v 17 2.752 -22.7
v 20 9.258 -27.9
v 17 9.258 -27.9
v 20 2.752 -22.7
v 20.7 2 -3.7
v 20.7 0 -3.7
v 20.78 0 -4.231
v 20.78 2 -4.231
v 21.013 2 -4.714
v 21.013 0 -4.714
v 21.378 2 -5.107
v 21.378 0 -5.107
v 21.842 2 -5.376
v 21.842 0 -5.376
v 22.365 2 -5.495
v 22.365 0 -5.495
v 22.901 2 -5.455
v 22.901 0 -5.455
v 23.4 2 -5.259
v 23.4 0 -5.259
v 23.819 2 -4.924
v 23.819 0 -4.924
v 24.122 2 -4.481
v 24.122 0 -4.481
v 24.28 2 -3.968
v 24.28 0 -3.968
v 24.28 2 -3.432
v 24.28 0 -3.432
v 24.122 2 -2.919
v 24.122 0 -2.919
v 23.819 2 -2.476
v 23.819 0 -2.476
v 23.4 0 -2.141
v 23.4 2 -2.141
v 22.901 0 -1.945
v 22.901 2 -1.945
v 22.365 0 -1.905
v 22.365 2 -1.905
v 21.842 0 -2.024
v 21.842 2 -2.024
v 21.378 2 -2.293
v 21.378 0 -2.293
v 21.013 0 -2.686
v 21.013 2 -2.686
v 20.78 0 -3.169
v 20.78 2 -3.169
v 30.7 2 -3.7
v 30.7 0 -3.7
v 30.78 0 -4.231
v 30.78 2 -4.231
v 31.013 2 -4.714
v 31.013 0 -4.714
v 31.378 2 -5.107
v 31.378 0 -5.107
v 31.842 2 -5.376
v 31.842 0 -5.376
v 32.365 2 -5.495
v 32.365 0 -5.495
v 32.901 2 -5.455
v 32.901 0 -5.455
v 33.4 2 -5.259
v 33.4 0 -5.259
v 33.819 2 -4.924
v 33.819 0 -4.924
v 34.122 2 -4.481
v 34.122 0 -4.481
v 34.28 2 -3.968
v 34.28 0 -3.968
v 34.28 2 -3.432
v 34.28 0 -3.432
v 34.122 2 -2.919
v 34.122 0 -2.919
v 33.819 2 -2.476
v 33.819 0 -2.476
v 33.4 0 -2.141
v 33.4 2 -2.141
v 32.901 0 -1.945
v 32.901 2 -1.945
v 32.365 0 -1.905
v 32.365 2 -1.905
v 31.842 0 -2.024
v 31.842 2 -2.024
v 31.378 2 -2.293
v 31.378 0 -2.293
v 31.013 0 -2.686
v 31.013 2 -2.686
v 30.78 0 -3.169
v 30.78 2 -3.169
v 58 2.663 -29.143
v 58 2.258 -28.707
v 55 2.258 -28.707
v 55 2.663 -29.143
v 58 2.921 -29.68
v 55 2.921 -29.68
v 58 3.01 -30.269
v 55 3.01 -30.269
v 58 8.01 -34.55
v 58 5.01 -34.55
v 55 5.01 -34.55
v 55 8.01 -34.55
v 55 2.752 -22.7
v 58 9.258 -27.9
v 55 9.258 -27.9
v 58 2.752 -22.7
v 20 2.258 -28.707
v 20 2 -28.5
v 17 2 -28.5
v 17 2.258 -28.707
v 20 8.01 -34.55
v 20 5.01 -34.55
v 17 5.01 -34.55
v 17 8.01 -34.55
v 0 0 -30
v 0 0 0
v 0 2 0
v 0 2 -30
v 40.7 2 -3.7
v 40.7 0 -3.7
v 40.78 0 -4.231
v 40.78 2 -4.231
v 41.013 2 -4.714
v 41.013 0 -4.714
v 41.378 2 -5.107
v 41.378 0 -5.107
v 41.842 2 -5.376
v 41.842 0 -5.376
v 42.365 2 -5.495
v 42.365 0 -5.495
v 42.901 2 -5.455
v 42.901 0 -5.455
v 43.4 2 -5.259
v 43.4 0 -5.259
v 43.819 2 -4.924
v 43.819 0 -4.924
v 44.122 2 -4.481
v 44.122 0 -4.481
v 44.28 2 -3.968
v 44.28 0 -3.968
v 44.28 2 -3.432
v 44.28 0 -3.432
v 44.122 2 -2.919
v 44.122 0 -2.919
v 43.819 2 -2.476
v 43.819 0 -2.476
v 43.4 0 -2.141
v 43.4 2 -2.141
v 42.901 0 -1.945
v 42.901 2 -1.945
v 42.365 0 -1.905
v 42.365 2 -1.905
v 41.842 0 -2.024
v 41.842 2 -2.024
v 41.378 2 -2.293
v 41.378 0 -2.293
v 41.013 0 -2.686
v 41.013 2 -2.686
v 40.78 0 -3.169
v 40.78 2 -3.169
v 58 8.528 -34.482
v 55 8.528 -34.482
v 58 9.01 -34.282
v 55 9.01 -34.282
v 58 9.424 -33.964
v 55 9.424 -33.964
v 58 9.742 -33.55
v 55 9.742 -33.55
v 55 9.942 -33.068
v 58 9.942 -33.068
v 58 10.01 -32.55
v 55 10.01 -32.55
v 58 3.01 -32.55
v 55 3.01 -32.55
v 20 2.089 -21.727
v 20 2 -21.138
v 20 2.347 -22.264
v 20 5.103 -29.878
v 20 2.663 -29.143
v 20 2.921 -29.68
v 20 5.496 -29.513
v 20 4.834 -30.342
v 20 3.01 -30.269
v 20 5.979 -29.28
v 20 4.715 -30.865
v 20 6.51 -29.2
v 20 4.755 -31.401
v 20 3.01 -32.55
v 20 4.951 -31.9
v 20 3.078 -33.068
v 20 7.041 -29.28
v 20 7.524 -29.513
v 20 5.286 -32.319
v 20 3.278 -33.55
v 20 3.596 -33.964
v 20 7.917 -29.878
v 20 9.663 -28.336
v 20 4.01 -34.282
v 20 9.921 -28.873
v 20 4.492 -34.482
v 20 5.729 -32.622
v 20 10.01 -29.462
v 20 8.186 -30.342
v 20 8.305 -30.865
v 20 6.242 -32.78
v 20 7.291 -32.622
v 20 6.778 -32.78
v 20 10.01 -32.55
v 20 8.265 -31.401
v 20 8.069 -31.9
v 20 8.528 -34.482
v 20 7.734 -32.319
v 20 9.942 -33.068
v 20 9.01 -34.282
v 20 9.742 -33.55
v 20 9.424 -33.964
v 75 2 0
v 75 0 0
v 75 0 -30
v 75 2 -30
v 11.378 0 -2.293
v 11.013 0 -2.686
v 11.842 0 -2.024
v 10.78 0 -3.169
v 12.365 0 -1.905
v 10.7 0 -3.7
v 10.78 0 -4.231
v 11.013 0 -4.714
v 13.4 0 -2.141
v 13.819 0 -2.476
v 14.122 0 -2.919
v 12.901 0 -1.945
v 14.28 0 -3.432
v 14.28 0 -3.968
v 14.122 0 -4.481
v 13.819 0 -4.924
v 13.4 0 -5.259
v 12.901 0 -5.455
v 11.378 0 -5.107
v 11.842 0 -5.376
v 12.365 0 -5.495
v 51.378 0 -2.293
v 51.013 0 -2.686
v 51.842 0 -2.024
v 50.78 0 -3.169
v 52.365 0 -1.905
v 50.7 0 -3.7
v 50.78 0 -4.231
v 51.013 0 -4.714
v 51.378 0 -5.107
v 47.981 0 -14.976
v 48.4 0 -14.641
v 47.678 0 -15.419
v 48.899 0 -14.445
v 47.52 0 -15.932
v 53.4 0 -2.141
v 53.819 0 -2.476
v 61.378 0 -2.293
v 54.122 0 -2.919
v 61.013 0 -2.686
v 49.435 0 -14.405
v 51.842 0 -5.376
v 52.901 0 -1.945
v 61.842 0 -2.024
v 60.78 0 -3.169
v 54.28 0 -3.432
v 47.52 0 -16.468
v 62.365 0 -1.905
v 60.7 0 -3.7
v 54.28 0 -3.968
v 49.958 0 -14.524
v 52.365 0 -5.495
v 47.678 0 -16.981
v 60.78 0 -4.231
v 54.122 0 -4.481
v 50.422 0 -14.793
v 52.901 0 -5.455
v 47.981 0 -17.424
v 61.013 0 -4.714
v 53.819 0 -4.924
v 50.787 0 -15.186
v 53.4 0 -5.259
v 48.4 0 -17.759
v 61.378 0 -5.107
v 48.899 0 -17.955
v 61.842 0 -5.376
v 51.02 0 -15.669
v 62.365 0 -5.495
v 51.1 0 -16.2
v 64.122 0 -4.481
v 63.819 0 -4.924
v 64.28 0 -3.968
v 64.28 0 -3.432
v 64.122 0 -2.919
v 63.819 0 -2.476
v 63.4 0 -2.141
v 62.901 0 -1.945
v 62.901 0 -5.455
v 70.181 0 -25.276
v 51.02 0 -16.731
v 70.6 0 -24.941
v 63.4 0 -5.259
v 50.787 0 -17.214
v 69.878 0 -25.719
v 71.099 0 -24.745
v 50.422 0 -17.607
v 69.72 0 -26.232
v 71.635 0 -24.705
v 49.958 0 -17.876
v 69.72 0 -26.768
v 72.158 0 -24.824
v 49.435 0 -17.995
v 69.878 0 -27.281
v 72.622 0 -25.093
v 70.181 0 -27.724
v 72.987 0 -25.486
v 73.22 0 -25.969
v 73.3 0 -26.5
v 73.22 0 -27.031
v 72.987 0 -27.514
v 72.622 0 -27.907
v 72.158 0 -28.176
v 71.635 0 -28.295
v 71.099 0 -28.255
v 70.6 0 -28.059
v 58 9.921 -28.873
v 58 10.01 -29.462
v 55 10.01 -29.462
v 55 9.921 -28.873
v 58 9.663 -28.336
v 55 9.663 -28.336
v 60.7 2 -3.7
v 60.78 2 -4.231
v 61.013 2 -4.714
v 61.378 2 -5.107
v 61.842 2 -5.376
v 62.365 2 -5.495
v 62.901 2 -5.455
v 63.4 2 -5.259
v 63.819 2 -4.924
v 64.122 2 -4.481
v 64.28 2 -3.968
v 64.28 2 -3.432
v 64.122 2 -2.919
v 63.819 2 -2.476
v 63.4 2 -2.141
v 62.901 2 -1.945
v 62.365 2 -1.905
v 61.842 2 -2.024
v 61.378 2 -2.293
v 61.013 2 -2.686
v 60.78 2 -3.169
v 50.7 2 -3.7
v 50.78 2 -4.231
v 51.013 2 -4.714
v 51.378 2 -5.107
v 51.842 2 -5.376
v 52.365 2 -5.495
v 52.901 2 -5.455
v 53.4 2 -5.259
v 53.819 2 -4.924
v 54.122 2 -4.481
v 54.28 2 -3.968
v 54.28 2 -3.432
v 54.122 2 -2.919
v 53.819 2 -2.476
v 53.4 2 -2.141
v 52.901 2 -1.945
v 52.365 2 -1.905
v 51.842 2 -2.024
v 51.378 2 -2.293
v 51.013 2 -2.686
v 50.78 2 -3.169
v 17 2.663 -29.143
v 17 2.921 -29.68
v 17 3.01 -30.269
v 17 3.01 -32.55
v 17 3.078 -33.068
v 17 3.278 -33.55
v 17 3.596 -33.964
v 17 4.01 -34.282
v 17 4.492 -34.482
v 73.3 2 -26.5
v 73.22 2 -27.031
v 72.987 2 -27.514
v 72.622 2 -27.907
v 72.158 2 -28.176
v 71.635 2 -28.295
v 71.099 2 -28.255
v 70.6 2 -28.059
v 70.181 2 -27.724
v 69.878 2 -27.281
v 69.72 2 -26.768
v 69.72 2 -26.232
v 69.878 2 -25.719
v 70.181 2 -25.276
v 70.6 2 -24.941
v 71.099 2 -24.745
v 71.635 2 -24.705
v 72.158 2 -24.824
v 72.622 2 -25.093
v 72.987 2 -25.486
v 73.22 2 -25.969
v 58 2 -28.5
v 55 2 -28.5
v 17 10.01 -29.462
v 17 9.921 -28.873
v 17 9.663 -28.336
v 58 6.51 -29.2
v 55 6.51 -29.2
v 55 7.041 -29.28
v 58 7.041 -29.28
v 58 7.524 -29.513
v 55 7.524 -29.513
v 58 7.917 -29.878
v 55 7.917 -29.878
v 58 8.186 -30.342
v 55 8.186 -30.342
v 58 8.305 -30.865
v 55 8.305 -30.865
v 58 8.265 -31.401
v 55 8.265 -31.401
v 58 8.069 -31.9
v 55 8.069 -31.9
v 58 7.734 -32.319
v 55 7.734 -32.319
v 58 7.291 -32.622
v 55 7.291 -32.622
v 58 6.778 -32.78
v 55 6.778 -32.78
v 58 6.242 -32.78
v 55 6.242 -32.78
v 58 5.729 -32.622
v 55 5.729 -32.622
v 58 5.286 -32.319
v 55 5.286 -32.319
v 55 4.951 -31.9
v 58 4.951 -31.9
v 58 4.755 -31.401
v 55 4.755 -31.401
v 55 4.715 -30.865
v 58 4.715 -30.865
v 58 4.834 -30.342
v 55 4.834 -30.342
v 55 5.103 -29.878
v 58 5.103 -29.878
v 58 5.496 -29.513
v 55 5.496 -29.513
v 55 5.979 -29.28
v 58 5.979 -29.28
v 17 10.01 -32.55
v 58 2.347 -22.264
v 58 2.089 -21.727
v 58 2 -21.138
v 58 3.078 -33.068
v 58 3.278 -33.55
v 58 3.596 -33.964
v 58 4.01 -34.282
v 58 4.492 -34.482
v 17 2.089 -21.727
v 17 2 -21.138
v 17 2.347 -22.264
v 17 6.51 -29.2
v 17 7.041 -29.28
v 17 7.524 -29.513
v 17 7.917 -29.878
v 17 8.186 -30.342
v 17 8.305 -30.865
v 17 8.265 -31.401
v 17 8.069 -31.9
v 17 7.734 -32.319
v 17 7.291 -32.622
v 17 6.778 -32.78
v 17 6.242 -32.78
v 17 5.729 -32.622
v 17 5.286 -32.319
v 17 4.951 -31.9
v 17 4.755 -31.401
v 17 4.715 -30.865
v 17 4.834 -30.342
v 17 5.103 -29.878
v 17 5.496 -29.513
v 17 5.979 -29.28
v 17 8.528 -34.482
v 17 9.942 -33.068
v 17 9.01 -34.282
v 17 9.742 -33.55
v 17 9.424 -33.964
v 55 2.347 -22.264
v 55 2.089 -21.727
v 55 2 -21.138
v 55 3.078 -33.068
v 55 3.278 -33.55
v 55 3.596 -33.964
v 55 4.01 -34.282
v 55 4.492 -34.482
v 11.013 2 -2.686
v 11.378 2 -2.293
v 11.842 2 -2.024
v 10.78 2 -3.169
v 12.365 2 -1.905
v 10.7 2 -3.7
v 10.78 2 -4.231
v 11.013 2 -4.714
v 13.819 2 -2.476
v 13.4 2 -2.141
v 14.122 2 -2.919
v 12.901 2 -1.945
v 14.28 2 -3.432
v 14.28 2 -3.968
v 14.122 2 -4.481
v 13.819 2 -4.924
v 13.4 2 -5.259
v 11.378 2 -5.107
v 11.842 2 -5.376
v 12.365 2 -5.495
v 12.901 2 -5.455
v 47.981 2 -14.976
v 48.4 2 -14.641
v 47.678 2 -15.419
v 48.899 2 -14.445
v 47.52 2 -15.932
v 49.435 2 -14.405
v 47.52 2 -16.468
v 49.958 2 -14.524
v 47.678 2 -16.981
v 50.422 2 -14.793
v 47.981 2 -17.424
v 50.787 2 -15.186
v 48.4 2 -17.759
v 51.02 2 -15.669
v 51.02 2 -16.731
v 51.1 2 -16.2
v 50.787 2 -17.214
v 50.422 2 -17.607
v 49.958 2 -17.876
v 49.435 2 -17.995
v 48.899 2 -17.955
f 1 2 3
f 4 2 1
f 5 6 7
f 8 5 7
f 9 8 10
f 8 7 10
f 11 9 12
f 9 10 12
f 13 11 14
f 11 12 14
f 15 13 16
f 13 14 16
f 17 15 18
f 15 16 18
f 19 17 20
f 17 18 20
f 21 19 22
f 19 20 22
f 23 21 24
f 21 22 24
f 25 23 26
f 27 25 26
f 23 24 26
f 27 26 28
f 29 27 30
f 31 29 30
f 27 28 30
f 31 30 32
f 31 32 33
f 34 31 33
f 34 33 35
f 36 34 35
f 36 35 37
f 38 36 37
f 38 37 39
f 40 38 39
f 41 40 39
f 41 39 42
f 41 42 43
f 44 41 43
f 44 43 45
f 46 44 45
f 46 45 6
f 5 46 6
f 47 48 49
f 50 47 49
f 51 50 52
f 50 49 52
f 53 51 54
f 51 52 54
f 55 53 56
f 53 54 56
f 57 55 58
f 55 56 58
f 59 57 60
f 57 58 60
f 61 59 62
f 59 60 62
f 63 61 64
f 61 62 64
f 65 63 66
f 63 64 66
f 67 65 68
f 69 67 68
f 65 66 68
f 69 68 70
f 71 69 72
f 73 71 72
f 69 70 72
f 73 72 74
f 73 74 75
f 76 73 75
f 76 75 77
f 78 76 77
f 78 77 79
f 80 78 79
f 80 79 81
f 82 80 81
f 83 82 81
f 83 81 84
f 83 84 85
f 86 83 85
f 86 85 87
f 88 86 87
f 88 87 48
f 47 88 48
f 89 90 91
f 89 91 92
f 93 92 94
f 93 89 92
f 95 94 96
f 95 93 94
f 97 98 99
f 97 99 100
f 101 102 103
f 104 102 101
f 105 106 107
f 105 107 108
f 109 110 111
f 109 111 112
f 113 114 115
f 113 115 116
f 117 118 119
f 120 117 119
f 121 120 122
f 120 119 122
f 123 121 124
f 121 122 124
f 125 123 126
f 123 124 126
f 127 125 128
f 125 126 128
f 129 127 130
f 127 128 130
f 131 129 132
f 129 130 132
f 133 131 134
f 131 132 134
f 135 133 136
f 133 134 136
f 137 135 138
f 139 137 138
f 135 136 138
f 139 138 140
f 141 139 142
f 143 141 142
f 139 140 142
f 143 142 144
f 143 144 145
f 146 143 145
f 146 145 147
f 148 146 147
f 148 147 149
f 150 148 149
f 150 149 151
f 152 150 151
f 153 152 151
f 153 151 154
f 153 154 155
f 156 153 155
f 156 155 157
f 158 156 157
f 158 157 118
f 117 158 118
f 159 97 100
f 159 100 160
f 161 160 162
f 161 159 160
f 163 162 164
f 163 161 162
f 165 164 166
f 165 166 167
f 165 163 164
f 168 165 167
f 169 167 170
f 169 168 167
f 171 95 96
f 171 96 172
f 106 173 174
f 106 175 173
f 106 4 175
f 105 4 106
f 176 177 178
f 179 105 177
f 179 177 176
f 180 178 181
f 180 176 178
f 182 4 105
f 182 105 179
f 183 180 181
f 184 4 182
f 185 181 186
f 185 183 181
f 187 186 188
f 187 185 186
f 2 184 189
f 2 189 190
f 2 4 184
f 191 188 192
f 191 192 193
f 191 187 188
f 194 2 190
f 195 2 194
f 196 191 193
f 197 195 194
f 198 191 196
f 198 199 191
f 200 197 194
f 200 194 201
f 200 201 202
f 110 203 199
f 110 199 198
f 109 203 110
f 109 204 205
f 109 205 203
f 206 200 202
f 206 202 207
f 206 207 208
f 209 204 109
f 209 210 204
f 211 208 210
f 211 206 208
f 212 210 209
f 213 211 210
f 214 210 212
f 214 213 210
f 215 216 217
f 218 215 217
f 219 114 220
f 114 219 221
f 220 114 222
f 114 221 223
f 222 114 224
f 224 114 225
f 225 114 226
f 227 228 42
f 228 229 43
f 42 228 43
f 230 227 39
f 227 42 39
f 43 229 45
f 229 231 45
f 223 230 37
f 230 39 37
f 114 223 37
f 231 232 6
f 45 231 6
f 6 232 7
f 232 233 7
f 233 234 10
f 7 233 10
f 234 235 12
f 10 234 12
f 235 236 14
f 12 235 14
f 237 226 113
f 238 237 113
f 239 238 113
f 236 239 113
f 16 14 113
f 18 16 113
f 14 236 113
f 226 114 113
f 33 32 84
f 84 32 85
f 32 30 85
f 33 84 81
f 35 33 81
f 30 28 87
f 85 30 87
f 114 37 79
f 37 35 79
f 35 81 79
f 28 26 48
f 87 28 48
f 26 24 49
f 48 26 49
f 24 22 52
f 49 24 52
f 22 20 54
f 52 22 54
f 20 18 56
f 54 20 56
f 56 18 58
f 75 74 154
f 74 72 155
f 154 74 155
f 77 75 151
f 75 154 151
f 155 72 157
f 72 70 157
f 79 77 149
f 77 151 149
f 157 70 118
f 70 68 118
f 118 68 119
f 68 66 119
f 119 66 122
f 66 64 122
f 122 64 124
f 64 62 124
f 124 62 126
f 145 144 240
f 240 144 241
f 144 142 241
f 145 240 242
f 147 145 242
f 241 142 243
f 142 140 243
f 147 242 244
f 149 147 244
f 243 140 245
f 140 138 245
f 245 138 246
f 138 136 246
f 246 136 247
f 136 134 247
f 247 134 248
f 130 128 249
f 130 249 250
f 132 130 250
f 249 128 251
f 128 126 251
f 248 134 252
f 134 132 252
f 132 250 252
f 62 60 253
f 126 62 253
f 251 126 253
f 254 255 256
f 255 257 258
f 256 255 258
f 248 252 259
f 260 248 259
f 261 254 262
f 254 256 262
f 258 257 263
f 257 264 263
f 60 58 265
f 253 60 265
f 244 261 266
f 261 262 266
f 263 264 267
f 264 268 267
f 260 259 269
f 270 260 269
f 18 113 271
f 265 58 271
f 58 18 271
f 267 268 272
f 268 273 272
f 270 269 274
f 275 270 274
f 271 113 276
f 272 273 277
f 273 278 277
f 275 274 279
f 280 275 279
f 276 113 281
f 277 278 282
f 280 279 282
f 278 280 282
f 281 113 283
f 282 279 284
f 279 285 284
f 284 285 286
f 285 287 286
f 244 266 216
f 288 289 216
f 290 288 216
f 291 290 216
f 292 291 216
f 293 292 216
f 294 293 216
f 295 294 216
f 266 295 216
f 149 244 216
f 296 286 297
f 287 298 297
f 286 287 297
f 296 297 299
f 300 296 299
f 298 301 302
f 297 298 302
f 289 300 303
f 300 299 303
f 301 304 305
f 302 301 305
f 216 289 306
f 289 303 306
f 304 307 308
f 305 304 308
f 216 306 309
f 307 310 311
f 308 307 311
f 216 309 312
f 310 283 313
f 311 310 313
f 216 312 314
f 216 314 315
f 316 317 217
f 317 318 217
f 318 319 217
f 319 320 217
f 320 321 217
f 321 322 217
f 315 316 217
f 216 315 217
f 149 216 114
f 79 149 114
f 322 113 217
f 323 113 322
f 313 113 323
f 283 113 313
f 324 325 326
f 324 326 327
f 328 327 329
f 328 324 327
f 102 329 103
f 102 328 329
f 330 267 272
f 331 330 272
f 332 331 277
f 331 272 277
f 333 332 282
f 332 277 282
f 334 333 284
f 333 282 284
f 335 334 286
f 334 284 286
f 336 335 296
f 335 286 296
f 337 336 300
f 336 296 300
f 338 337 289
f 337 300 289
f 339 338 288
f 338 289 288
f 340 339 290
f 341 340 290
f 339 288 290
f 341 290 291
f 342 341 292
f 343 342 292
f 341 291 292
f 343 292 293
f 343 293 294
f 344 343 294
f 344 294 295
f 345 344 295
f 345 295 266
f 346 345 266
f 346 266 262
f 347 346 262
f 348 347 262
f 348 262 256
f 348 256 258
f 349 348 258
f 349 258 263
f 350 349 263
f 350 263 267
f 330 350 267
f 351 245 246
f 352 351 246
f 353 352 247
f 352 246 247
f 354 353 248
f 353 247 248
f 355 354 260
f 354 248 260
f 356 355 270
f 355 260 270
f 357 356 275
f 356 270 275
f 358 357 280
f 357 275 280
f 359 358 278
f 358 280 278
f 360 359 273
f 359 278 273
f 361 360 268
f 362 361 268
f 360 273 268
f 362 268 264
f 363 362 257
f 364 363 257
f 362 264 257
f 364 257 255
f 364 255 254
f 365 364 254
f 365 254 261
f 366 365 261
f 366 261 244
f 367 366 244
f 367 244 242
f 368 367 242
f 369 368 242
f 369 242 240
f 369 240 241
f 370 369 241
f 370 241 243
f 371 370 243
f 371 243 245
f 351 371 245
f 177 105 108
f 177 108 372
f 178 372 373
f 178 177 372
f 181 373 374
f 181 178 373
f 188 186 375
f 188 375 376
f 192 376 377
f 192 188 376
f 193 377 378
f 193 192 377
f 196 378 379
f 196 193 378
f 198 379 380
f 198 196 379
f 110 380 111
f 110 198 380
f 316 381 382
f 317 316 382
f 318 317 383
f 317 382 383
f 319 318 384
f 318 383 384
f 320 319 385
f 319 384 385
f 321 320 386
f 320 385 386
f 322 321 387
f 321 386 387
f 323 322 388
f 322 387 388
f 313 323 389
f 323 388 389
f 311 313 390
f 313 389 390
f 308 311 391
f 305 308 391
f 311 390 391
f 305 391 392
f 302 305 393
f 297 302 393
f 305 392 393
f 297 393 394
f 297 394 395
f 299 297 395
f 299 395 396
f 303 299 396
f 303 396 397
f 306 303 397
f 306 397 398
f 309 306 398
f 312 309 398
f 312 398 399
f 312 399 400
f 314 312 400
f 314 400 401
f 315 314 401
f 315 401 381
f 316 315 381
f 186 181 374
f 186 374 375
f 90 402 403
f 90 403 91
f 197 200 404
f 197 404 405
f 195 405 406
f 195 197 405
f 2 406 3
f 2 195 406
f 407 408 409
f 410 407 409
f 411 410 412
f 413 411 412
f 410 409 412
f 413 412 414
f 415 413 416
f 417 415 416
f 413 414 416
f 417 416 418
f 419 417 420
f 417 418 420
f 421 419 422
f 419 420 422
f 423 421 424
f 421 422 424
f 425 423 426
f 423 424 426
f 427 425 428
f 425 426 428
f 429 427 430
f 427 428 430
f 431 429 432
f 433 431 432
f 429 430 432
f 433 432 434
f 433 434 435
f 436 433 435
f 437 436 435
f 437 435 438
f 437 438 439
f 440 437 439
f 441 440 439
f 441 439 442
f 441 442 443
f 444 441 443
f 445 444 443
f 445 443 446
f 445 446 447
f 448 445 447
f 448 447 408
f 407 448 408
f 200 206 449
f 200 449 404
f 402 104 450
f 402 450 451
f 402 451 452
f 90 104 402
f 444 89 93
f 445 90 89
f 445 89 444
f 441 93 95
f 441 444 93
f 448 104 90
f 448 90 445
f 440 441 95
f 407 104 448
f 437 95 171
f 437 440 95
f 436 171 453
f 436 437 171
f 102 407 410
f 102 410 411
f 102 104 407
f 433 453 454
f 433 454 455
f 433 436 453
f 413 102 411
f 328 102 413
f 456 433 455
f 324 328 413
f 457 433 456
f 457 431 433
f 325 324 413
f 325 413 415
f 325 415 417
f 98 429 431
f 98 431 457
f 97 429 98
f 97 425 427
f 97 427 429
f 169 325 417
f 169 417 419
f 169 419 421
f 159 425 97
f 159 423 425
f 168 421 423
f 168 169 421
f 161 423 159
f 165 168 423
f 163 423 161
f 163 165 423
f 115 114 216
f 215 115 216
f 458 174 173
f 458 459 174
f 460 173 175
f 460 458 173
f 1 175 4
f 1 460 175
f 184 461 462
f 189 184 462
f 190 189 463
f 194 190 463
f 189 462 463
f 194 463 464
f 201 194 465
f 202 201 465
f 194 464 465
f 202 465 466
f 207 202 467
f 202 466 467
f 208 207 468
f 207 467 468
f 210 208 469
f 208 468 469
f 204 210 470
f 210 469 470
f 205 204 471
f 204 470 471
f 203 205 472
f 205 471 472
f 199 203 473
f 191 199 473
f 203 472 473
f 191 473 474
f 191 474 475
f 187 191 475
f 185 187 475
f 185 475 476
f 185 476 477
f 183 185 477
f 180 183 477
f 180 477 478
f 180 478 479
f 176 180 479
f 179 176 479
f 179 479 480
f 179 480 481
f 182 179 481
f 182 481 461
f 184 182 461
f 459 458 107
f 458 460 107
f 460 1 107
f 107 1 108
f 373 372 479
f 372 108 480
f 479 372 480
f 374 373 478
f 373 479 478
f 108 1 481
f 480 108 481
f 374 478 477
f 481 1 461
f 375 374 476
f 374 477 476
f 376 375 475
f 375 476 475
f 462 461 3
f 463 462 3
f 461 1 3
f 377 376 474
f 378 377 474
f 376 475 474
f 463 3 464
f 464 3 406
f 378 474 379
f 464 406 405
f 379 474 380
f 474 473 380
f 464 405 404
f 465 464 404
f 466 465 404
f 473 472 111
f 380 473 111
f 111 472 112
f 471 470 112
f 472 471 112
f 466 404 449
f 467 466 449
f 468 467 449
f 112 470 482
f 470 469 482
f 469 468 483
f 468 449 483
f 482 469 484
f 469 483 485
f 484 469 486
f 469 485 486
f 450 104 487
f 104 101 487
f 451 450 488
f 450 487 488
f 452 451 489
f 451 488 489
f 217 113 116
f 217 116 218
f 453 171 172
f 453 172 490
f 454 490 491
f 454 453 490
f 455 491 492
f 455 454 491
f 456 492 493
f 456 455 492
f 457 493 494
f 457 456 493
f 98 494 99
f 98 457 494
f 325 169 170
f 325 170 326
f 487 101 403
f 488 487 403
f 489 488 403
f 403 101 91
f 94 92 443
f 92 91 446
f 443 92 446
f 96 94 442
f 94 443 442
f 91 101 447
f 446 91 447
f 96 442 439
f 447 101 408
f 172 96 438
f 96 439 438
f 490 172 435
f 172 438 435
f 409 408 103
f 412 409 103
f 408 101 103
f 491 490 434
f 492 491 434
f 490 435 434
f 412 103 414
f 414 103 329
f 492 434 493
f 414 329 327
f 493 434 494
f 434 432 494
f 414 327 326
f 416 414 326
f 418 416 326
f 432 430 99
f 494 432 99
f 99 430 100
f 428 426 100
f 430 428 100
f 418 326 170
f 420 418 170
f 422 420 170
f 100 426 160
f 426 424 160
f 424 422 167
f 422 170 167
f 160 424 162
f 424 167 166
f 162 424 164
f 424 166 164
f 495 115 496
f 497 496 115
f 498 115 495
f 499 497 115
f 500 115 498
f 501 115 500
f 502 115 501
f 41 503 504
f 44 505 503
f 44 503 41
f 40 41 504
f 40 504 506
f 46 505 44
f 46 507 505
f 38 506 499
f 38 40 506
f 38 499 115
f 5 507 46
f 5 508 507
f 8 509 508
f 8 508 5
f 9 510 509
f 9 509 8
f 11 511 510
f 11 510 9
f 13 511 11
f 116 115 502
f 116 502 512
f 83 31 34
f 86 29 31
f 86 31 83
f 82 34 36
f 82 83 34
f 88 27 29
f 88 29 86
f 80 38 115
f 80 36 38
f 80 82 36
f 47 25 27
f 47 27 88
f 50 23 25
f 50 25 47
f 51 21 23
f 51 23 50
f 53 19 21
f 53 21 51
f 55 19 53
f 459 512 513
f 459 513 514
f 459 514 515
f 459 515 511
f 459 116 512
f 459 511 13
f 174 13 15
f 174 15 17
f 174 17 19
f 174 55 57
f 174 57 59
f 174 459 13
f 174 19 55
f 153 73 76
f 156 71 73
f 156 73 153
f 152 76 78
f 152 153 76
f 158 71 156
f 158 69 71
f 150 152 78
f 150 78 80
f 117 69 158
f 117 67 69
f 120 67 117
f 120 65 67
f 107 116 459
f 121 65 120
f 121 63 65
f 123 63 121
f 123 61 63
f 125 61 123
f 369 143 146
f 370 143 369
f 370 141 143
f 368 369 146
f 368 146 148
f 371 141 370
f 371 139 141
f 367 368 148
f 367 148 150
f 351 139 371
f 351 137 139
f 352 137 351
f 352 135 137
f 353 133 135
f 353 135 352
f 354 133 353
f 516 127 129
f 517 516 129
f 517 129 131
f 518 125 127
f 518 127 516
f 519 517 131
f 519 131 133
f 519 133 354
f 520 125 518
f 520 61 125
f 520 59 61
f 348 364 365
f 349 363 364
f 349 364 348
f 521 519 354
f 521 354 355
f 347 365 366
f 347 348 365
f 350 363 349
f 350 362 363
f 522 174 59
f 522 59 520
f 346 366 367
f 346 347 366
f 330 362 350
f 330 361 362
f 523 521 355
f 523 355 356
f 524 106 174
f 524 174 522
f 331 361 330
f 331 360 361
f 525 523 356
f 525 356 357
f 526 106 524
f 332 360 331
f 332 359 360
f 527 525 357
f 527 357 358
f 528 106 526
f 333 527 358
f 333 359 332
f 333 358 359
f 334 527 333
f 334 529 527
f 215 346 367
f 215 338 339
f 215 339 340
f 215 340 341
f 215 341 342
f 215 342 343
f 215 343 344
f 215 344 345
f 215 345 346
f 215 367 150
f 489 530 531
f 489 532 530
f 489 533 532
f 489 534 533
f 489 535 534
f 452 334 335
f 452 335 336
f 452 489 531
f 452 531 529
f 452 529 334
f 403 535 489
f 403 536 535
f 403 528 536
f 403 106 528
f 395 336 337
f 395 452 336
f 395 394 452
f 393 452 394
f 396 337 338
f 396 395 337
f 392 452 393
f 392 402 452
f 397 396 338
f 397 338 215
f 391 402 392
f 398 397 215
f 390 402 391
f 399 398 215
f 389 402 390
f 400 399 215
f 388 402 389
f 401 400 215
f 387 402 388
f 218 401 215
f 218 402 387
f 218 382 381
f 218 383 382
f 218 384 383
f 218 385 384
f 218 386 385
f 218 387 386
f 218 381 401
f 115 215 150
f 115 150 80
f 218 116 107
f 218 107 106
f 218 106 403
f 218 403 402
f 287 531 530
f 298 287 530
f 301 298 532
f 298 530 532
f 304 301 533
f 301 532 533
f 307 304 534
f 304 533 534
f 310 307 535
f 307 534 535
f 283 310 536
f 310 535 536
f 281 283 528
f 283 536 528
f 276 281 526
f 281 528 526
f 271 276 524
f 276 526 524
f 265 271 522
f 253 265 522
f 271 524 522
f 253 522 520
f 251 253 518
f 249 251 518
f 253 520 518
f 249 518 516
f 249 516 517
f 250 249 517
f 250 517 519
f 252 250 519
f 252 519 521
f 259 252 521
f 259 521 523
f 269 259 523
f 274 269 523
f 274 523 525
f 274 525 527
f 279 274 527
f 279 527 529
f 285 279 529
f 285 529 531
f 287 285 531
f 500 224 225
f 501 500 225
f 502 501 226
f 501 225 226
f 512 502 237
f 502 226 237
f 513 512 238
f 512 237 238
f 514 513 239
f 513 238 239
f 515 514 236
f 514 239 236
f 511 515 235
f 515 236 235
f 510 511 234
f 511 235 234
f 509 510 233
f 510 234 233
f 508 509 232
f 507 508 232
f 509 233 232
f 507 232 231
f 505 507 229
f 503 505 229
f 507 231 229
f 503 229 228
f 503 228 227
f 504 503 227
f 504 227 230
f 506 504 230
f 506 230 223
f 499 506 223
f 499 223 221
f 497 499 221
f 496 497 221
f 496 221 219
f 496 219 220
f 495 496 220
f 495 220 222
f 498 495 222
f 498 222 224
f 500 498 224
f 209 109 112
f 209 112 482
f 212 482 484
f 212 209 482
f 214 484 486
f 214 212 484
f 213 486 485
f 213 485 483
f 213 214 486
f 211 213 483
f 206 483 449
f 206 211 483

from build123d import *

# Parameters (mm, degrees)
SKETCH1_W            = 75
SKETCH1_H            = 30
BOSS_EXTRUDE1_DEPTH  = 2
M3_CLEARANCE_HOLE1_D = 3.6
SKETCH4_R            = 1.75
BOSS_EXTRUDE2_DEPTH  = 3
BOSS_EXTRUDE3_START  = -38
SKETCH4_2_R          = 1.75
BOSS_EXTRUDE3_DEPTH  = 3
FILLET1_R            = 2
M3_CLEARANCE_HOLE2_D = 3.6
M3_CLEARANCE_HOLE3_D = 3.6


with BuildPart() as part:
    # Sketch1 → Boss-Extrude1 (new body)
    with BuildSketch(Plane(origin=(0, 0, 0), x_dir=(1, 0, 0), z_dir=(0, 1, 0))):
        with Locations((37.5, 15)):
            Rectangle(SKETCH1_W, SKETCH1_H)
    extrude(amount=BOSS_EXTRUDE1_DEPTH)

    # M3 Clearance Hole1 (through all)
    with Locations(Plane(origin=(0, 2, 0), x_dir=(1, 0, 0), z_dir=(0, 1, 0))):
        with Locations((42.5, 3.7), (32.5, 3.7), (22.5, 3.7), (12.5, 3.7), (62.5, 3.7), (52.5, 3.7)):
            Hole(M3_CLEARANCE_HOLE1_D / 2)

    # Sketch4 → Boss-Extrude2 (add)
    # profile 1 of 2: a face of its own
    with BuildSketch(Plane.ZY.offset(-20)):
        with BuildLine():
            ThreePointArc((-29.462001252, 10.010018789), (-28.595073643, 9.812360744), (-27.899501252, 9.258455311))
            Line((-27.899501252, 9.258455311), (-22.1, 2))
            Line((-22.1, 2), (-28.5, 2))
            Line((-28.5, 2), (-28.706505632, 2.258455311))
            ThreePointArc((-28.706505632, 2.258455311), (-29.402078024, 2.812360744), (-30.269005632, 3.010018789))
            Line((-30.269005632, 3.010018789), (-32.55, 3.010018789))
            ThreePointArc((-32.55, 3.010018789), (-33.964213562, 3.595805227), (-34.55, 5.010018789))
            Line((-34.55, 5.010018789), (-34.55, 8.010018789))
            ThreePointArc((-34.55, 8.010018789), (-33.964213562, 9.424232352), (-32.55, 10.010018789))
            Line((-32.55, 10.010018789), (-29.462001252, 10.010018789))
        make_face()
        with Locations((-31, 6.510018789)):
            Circle(SKETCH4_R, mode=Mode.SUBTRACT)
    # profile 2 of 2: a face of its own
    with BuildSketch(Plane.ZY.offset(-20)):
        with Locations((-31, 6.510018789)):
            Circle(SKETCH4_R)
    extrude(amount=BOSS_EXTRUDE2_DEPTH)

    # Sketch4<2> → Boss-Extrude3 (add)
    # profile 1 of 2: a face of its own
    with BuildSketch(Plane.ZY.offset(-20).offset(BOSS_EXTRUDE3_START)):
        with BuildLine():
            ThreePointArc((-29.462001252, 10.010018789), (-28.595073643, 9.812360744), (-27.899501252, 9.258455311))
            Line((-27.899501252, 9.258455311), (-22.1, 2))
            Line((-22.1, 2), (-28.5, 2))
            Line((-28.5, 2), (-28.706505632, 2.258455311))
            ThreePointArc((-28.706505632, 2.258455311), (-29.402078024, 2.812360744), (-30.269005632, 3.010018789))
            Line((-30.269005632, 3.010018789), (-32.55, 3.010018789))
            ThreePointArc((-32.55, 3.010018789), (-33.964213562, 3.595805227), (-34.55, 5.010018789))
            Line((-34.55, 5.010018789), (-34.55, 8.010018789))
            ThreePointArc((-34.55, 8.010018789), (-33.964213562, 9.424232352), (-32.55, 10.010018789))
            Line((-32.55, 10.010018789), (-29.462001252, 10.010018789))
        make_face()
        with Locations((-31, 6.510018789)):
            Circle(SKETCH4_2_R, mode=Mode.SUBTRACT)
    # profile 2 of 2: a face of its own
    with BuildSketch(Plane.ZY.offset(-20).offset(BOSS_EXTRUDE3_START)):
        with Locations((-31, 6.510018789)):
            Circle(SKETCH4_2_R)
    extrude(amount=BOSS_EXTRUDE3_DEPTH)

    # Fillet1
    fillet1_edges = [part.edges().sort_by_distance(p)[0] for p in [
        (18.5, 2, -22.1),
        (56.5, 2, -22.1),
    ]]
    fillet(fillet1_edges, radius=FILLET1_R)

    # M3 Clearance Hole2 (through all)
    with Locations(Plane(origin=(58, 0, 0), x_dir=(0, 0, -1), z_dir=(1, 0, 0))):
        with Locations((31, 6.510018789)):
            Hole(M3_CLEARANCE_HOLE2_D / 2)

    # M3 Clearance Hole3 (through all)
    with Locations(Plane(origin=(0, 0, 0), x_dir=(-1, 0, 0), z_dir=(0, -1, 0))):
        with Locations((-49.3, 16.2), (-71.5, 26.5)):
            Hole(M3_CLEARANCE_HOLE3_D / 2)


solid = part.part
